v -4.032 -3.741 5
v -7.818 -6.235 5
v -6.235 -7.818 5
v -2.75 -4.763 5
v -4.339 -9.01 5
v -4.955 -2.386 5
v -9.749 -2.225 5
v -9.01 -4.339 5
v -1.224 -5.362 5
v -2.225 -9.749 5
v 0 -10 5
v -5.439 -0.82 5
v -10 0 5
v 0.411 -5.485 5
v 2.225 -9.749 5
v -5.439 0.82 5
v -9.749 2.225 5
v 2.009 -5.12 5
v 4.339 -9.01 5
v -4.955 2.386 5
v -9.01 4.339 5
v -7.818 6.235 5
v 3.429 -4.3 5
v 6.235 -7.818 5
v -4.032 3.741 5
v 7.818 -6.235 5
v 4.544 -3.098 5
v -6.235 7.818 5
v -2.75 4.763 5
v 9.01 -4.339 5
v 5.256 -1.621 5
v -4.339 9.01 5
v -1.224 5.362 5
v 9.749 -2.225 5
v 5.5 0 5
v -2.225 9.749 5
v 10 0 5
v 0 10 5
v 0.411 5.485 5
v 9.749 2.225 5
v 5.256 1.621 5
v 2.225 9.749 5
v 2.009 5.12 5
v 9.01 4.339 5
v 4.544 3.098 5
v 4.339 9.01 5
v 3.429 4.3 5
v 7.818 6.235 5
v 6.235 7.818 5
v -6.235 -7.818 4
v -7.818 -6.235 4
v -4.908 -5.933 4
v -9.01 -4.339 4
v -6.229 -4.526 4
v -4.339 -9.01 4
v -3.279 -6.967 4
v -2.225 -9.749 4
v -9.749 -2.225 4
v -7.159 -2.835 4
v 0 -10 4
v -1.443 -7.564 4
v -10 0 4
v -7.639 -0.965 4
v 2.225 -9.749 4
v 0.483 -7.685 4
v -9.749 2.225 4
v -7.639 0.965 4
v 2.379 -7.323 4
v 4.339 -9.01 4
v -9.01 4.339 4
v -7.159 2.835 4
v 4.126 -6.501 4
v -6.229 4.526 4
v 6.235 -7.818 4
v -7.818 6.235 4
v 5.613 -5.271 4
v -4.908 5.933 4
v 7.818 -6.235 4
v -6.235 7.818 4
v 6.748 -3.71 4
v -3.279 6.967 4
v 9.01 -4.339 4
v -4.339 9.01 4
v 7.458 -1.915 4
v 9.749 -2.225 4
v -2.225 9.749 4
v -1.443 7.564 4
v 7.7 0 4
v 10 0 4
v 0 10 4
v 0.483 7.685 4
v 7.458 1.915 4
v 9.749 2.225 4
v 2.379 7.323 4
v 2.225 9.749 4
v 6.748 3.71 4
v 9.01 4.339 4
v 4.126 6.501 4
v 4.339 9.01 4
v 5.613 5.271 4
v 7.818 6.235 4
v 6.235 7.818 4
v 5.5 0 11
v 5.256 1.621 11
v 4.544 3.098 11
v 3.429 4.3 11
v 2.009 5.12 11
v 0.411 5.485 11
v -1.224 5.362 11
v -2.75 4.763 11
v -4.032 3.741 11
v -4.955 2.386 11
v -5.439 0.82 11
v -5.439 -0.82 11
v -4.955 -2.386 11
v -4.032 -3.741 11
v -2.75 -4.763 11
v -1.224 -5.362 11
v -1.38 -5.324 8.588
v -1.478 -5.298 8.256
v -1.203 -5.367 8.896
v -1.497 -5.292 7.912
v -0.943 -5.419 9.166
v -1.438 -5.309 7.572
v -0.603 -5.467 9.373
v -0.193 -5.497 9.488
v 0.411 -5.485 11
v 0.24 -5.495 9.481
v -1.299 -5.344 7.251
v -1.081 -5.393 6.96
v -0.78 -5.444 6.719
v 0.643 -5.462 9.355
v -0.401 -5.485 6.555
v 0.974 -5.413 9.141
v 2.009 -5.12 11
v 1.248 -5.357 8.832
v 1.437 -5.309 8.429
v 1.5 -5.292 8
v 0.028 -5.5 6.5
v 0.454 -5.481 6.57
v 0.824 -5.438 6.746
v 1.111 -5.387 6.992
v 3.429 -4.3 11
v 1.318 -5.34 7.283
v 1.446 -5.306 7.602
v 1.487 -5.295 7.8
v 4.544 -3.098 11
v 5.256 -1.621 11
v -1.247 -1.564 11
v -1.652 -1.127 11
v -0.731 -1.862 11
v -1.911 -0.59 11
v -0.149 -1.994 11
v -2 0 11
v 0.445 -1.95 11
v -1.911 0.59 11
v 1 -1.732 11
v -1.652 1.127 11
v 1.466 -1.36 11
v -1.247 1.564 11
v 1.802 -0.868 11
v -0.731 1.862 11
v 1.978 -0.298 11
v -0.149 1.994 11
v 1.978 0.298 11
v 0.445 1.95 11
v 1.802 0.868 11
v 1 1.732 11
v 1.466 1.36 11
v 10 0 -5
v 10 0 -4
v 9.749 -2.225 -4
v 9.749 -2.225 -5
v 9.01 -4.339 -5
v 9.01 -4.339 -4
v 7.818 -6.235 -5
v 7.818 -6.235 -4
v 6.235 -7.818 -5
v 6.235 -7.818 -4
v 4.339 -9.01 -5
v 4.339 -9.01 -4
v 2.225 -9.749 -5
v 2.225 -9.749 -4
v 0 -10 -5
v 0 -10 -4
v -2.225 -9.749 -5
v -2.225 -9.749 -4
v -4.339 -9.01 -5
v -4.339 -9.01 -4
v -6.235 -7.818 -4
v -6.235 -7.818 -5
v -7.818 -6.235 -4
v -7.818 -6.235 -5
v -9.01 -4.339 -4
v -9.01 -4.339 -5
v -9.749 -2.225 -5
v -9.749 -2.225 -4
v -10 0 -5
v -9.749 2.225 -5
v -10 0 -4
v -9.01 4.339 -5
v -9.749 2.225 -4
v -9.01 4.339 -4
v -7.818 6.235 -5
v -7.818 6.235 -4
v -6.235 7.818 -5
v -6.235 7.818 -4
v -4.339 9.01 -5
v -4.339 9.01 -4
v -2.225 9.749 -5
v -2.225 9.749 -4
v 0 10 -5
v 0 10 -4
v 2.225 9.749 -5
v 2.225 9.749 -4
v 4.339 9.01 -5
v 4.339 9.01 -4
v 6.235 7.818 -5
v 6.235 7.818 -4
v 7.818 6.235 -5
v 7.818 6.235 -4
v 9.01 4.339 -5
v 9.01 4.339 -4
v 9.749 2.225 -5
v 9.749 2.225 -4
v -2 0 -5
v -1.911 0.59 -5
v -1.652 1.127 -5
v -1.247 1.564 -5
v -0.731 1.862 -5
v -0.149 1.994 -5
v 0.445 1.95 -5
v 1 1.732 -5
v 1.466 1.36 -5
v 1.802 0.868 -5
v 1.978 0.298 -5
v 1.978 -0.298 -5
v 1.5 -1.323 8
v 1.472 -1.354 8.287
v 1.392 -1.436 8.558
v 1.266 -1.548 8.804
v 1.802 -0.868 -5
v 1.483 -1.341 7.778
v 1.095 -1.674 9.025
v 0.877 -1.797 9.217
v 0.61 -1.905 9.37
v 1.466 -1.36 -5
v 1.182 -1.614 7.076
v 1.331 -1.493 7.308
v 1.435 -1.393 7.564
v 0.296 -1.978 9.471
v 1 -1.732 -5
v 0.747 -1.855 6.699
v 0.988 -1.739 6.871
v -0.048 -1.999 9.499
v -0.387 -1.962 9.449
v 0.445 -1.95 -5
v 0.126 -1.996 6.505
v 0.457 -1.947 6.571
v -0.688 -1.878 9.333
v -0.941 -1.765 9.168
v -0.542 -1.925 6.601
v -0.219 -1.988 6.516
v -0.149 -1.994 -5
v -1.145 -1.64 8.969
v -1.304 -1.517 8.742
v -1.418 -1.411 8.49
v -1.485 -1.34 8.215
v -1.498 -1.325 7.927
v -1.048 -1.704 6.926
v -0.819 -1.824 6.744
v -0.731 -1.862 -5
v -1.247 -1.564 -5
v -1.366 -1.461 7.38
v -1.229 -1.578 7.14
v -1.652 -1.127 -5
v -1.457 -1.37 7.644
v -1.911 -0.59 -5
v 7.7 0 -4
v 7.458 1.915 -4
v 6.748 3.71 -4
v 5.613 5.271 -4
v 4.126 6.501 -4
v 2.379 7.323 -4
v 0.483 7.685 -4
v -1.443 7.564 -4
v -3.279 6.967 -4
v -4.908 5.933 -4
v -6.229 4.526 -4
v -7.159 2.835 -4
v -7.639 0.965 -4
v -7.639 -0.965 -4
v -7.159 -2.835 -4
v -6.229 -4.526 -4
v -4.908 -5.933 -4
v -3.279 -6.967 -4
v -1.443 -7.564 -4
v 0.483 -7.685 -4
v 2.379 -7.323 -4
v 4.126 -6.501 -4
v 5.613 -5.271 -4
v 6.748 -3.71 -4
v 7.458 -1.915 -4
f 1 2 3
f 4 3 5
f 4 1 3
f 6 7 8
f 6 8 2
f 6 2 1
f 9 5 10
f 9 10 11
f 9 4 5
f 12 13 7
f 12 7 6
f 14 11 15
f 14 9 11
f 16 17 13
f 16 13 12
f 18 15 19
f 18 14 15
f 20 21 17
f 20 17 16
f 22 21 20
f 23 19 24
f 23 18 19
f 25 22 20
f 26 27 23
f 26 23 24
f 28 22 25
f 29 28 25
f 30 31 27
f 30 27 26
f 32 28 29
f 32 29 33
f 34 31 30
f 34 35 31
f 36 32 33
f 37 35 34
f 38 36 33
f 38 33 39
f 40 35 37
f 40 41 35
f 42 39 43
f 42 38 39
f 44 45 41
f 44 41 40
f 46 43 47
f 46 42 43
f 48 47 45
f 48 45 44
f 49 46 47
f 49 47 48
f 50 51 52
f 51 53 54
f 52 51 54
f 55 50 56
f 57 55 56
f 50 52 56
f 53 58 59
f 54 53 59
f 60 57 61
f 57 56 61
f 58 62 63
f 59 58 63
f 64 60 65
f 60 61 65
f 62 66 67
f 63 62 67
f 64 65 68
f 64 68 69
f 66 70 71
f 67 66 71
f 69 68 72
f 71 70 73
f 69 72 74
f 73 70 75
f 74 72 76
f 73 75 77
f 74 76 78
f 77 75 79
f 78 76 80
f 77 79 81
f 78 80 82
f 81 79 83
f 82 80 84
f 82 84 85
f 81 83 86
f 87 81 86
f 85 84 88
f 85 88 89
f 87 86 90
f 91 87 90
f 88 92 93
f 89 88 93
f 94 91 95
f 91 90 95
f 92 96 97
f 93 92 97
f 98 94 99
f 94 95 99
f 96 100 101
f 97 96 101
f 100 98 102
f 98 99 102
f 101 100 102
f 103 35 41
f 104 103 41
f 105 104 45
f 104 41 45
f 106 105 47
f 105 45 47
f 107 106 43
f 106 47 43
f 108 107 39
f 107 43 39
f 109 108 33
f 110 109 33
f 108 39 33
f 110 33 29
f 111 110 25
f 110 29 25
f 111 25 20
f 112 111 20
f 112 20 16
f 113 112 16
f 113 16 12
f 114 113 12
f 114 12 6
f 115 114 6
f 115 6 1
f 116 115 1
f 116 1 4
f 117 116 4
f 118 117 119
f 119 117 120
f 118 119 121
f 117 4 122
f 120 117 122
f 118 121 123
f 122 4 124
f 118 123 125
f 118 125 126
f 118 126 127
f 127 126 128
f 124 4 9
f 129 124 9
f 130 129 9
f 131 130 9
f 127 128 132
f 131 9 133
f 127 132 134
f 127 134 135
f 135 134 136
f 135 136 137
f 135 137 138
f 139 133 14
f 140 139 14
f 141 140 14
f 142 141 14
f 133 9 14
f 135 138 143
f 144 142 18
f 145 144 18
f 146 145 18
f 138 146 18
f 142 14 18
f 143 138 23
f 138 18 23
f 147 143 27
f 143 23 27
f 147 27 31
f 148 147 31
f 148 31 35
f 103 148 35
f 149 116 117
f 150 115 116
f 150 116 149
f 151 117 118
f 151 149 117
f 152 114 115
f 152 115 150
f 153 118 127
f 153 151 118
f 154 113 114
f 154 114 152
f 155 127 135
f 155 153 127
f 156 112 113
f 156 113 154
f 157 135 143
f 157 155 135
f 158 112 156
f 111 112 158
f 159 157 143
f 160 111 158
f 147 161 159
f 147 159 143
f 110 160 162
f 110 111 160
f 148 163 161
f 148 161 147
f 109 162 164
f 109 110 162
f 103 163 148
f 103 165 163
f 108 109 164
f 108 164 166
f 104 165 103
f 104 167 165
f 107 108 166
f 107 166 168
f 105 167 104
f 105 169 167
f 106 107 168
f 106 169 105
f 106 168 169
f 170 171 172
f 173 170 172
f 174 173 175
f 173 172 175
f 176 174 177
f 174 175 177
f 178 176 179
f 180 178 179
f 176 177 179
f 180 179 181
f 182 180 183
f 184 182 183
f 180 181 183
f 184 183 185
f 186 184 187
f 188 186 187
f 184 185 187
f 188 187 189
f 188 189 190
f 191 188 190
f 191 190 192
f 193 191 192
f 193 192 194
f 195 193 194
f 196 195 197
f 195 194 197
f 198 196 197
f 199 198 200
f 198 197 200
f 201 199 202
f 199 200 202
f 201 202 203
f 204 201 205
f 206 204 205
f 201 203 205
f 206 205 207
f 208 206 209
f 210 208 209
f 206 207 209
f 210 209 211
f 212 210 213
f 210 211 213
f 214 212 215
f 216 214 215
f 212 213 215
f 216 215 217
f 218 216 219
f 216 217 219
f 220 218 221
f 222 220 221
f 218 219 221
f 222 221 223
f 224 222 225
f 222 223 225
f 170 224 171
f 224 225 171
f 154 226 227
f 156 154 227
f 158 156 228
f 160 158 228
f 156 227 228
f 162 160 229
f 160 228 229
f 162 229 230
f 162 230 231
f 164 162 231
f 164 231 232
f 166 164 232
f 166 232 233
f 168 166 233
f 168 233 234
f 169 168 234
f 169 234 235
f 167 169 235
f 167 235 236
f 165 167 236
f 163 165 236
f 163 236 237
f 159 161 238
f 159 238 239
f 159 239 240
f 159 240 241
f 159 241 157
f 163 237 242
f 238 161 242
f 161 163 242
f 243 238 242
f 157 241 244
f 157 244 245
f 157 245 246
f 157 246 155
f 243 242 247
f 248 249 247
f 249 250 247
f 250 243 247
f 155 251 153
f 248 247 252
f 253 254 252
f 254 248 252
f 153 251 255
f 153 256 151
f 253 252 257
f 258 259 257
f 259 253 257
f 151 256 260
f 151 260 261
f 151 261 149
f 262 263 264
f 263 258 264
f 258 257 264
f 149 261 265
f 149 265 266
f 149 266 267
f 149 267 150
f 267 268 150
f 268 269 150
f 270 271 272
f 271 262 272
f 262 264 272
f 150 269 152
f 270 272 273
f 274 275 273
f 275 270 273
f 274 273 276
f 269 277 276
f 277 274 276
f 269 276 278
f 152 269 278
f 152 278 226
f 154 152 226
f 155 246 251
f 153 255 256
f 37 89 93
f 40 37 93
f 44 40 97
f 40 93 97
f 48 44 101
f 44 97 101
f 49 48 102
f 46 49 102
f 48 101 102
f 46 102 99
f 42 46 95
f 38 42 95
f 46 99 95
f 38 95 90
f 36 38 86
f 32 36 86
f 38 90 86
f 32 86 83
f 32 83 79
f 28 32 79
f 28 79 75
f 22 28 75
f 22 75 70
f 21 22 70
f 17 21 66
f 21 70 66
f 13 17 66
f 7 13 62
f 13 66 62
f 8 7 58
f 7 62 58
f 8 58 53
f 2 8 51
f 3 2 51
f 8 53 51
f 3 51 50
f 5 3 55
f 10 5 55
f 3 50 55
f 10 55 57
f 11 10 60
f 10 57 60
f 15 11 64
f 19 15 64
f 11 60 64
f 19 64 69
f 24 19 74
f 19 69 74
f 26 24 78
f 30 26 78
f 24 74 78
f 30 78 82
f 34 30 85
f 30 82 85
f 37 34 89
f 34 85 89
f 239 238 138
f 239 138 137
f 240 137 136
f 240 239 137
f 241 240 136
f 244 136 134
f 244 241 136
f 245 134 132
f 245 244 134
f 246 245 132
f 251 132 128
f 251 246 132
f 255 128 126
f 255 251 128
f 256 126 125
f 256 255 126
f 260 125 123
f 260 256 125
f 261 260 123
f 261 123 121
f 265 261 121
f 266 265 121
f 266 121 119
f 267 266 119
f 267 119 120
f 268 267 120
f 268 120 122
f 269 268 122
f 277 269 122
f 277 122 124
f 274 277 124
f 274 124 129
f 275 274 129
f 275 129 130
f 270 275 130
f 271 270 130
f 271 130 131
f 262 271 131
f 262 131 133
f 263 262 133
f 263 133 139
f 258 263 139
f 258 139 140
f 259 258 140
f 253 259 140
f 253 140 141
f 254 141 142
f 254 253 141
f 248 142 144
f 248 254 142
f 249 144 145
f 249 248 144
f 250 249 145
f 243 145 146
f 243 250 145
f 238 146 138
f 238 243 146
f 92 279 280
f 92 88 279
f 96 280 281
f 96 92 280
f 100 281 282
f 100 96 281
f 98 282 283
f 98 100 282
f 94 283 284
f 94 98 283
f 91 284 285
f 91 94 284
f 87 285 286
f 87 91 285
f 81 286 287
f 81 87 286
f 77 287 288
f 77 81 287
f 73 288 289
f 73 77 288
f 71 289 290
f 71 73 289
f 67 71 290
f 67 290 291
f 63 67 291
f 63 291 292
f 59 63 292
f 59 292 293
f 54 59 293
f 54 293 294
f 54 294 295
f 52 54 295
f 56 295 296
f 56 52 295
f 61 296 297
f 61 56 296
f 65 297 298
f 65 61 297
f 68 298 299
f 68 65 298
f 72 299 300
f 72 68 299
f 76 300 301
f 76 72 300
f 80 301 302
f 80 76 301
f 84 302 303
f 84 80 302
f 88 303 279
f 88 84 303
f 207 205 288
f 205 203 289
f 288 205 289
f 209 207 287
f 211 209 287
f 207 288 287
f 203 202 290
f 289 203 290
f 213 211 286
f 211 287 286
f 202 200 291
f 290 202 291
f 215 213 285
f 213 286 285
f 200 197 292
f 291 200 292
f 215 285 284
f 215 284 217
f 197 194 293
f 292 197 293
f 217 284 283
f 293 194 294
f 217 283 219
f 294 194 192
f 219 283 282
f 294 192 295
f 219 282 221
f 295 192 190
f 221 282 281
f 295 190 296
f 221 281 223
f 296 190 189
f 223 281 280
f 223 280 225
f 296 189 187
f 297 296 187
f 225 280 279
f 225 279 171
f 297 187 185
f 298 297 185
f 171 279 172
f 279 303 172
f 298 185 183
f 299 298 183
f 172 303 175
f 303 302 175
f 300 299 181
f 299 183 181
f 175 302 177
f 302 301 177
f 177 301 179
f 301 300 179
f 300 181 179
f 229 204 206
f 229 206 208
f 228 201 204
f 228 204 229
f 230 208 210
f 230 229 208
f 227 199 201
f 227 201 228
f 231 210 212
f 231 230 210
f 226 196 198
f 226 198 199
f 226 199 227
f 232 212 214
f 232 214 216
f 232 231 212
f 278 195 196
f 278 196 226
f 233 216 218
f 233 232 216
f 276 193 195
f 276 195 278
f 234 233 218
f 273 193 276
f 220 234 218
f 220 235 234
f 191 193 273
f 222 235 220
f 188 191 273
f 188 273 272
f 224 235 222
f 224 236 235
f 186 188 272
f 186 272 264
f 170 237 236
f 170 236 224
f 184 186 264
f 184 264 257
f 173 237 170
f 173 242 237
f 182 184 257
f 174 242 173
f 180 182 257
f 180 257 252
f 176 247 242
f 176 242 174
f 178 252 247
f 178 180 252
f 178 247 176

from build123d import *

# Parameters (mm, degrees)
F0_R      = 7.7
F1_DEPTH  = 4
F2_R      = 10
F2_R_2    = 7.7
F3_DEPTH  = 1
F4_R      = 10
F4_R_2    = 7.7
F5_DEPTH  = 1
F6_R      = 5.5
F7_DEPTH  = 6
F9_D      = 4
F10_R     = 1.5
F11_DEPTH = 25


with BuildPart() as f1:
    # F0 (on Top) → F1 (new body, symmetric)
    with BuildSketch(Plane.XY):
        Circle(F0_R)
    extrude(amount=F1_DEPTH, both=True)

    # F2 (on face) → F3 (join)
    with BuildSketch(Plane.XY.offset(4)):
        Circle(F2_R)
        Circle(F2_R_2, mode=Mode.SUBTRACT)
        Circle(F2_R_2)
    extrude(amount=F3_DEPTH)

    # F4 (on face) → F5 (join)
    with BuildSketch(Plane(origin=(0, 0, -4), x_dir=(1, 0, 0), z_dir=(0, 0, -1))):
        Circle(F4_R)
        Circle(F4_R_2, mode=Mode.SUBTRACT)
        Circle(F4_R_2)
    extrude(amount=F5_DEPTH)

    # F6 (on face) → F7 (join)
    with BuildSketch(Plane.XY.offset(5)):
        Circle(F6_R)
    extrude(amount=F7_DEPTH)

    # F9 (through all)
    with Locations(Plane.XY.offset(11)):
        with Locations((0, 0)):
            Hole(F9_D / 2)

    # F10 (on Front) → F11 (cut)
    with BuildSketch(Plane.XZ):
        with Locations((0, 8)):
            Circle(F10_R)
    extrude(amount=F11_DEPTH, mode=Mode.SUBTRACT)


solid = f1.part
